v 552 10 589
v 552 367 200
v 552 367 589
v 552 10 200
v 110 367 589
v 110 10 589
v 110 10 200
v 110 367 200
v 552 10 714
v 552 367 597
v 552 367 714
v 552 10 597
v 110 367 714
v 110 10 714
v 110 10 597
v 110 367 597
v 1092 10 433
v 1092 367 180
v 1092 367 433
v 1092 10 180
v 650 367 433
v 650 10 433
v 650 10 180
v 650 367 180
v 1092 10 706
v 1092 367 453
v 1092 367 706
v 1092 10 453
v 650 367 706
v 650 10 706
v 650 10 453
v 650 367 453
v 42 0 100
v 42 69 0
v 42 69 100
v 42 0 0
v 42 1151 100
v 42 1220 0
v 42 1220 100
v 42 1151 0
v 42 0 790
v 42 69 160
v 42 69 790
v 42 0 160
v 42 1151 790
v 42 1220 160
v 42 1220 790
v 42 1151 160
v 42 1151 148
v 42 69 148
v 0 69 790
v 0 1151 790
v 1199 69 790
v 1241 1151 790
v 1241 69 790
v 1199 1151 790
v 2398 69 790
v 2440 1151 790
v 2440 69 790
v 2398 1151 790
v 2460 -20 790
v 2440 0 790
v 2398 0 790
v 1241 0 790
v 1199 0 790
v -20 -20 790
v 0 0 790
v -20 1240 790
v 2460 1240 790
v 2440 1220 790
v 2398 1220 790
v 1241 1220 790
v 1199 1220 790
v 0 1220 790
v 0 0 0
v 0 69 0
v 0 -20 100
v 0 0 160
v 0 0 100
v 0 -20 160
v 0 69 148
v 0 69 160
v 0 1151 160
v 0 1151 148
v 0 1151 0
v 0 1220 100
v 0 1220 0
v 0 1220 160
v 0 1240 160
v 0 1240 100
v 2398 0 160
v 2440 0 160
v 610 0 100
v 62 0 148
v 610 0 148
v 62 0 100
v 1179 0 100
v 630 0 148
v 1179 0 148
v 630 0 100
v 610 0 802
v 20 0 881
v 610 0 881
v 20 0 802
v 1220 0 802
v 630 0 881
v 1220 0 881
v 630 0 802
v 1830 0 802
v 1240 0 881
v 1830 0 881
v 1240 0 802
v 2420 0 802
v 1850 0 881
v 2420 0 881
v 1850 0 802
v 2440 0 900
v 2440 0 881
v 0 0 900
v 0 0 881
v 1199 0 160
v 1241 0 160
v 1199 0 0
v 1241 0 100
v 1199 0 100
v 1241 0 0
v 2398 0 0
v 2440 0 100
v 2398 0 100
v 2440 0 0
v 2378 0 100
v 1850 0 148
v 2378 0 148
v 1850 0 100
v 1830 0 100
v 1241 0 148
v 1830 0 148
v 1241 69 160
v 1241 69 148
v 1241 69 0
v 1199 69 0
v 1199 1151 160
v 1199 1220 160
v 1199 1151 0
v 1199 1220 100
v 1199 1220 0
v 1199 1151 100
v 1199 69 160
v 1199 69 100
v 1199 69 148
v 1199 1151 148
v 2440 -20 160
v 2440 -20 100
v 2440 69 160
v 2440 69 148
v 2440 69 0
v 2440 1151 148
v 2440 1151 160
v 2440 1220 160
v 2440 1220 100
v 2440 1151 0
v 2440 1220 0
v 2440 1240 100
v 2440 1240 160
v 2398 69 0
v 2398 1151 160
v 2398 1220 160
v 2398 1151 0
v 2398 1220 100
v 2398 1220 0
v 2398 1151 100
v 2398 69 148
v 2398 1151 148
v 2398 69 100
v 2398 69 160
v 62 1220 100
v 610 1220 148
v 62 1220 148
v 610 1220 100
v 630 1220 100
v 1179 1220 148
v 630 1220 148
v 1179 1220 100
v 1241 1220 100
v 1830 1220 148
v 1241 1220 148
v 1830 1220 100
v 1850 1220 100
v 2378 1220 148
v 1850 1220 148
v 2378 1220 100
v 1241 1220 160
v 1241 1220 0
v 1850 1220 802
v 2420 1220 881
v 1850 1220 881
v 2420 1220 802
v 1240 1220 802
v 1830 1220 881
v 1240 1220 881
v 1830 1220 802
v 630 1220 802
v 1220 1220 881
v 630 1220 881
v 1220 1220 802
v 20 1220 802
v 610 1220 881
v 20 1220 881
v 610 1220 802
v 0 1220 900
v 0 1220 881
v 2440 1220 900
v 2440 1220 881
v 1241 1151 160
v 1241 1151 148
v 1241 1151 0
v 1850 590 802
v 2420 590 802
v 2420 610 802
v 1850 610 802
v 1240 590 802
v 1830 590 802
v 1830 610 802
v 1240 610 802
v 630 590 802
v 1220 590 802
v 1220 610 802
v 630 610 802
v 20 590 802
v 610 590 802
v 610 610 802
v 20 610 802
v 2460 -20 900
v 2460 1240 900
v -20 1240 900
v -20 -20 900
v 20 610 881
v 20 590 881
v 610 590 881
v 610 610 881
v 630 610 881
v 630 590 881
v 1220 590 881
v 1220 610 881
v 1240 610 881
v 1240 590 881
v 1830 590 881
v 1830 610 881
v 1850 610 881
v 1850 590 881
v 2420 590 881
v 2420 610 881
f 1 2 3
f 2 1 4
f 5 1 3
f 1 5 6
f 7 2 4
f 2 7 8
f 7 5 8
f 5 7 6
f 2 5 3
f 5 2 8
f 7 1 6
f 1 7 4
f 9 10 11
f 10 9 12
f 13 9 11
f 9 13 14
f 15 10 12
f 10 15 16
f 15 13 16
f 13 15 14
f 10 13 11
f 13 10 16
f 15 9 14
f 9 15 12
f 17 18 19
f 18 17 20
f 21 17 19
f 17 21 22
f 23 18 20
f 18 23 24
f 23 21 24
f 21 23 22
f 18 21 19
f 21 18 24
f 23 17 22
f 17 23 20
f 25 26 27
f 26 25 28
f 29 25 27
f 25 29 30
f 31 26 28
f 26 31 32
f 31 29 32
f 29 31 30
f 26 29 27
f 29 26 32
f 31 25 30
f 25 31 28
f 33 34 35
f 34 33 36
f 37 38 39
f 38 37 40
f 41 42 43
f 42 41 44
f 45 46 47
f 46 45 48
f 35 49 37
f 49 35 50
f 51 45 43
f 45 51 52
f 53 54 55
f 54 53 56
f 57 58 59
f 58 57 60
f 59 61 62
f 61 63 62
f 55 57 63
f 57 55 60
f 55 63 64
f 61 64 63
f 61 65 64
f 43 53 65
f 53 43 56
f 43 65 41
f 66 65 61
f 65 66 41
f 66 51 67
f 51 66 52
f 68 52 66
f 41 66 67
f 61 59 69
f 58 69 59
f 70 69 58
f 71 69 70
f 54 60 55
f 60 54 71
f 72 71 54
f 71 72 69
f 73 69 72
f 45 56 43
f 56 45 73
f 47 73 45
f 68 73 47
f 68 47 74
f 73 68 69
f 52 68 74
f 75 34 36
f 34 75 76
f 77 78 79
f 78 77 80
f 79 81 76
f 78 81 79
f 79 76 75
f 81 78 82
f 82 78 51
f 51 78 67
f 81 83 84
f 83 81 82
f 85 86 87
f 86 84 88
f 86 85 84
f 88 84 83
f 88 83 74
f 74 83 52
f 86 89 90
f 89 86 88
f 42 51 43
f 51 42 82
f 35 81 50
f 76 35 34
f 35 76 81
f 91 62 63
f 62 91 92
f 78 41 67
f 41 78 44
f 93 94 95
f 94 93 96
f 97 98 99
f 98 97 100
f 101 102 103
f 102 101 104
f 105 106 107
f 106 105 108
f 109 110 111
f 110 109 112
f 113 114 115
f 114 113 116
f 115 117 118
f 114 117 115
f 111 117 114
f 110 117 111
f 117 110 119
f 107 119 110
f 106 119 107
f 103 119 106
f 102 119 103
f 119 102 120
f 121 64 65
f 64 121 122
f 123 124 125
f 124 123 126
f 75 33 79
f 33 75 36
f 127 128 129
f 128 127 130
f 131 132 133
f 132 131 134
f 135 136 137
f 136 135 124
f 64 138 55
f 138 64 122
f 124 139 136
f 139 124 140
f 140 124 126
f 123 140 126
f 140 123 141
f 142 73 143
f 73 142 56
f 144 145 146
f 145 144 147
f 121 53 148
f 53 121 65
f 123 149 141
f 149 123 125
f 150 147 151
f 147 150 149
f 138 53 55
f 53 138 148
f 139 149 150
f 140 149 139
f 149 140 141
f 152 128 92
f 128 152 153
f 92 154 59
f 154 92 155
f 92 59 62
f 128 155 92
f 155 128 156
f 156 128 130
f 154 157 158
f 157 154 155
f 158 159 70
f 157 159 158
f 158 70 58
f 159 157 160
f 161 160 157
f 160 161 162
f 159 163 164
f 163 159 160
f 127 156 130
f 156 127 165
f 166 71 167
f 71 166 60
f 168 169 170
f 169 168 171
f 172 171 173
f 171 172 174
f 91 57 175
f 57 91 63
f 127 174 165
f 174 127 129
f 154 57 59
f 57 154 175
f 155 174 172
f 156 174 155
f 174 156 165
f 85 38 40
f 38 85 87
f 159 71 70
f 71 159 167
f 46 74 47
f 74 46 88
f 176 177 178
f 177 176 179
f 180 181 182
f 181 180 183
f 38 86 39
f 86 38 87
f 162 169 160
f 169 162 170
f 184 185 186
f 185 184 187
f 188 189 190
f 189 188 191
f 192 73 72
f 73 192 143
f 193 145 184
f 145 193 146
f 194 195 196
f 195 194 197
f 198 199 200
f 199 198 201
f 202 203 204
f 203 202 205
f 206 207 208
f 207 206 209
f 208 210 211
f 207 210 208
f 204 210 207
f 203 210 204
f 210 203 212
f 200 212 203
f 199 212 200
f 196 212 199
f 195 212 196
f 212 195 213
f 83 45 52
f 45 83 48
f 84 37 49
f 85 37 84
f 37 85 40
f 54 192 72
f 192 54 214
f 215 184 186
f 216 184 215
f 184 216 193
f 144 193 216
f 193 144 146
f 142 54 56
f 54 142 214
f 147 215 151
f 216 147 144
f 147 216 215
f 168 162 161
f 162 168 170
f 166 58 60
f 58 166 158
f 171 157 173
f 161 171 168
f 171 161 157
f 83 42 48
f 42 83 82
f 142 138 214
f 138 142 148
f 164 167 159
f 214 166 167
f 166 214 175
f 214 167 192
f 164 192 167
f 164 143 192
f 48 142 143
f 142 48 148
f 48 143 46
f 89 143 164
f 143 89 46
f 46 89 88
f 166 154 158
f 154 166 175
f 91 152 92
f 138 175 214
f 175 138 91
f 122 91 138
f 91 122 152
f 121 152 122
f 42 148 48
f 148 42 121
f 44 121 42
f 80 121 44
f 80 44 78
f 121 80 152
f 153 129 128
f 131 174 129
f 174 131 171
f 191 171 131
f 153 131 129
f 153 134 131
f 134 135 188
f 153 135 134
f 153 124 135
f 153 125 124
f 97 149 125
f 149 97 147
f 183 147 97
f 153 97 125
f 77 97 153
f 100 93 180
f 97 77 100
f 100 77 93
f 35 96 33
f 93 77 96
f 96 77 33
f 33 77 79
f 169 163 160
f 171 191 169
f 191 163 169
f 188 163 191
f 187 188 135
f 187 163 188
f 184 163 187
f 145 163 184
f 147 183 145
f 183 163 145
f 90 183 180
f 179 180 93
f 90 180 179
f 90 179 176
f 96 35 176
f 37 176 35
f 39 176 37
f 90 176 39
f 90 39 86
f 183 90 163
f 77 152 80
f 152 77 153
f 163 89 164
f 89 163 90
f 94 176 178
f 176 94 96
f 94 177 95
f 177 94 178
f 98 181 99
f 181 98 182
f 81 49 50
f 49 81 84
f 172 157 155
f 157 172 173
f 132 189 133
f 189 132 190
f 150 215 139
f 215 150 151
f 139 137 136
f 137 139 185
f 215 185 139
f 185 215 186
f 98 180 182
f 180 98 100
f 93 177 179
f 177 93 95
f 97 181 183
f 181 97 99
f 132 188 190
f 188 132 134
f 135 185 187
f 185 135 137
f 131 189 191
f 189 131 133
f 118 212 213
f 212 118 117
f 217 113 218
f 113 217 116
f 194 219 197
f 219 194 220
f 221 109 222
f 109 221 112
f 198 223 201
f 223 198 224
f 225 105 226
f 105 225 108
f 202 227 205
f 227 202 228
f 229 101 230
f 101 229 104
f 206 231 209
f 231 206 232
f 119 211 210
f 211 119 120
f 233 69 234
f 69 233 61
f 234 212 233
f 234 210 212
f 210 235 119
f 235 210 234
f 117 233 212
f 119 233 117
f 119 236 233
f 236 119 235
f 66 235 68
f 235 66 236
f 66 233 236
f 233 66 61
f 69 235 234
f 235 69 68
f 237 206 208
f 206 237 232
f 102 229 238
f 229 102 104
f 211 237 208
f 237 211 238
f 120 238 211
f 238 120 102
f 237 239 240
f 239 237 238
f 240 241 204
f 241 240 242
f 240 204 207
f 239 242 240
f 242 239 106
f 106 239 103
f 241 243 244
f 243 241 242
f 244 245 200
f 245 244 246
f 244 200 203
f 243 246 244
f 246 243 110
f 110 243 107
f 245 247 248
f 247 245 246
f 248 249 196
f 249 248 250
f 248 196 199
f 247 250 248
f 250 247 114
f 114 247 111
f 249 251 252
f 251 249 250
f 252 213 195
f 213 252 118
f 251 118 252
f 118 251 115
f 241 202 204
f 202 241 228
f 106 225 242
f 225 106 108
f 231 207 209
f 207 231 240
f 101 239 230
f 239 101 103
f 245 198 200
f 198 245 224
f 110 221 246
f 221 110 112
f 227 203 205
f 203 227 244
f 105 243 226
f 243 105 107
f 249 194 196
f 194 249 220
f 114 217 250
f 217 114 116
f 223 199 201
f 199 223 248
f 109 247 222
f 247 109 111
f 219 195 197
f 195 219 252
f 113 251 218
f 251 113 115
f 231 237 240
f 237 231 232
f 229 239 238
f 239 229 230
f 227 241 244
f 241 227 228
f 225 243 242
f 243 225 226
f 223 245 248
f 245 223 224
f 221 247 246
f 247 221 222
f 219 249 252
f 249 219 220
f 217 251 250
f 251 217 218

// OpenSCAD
/*

    Nightstand
    
    By Anton Augustsson
    
    
*/

//https://www.hornbach.se/shop/MDF-Board-19x2440x1220-mm/5115465/artikel-detaljer.html
//https://www.hornbach.se/shop/Furuplywood-BB-X-12x1220x2440-mm-WBP-LIM/5507269/artikel-detaljer.html



/*
    ---------- Variables ---------- 
*/

standardSheathingWidth = 1220; 
standardSheathingLength = 2440;

mdfTopThickness = 19;
plywoodTopThickness = 12;

// Side protection for ply and mdf
edgeTopThickness = 20; 
edgeTopWidth = 110;
edgeTopLengthX = standardSheathingLength
    +2*edgeTopThickness;
edgeTopLengthY = standardSheathingWidth
    +2*edgeTopThickness;

// 4 list betweend mdf and ply (Pine)
listTopThickness = 20; 
listTopWidth = edgeTopWidth
    -plywoodTopThickness
    -mdfTopThickness;
listTopLengthX = standardSheathingLength/4
    -listTopThickness;
listTopLengthY = standardSheathingWidth;

// 6 legs (Pine)
legLength = 900-edgeTopWidth;
legWidth = 69;
legThickness = 42;

// 3 bottom list (Pine)
listBottomThickness = 20; 
listBottomWidth1 = 60;
listBottomWidth2 = listBottomWidth1
    -plywoodTopThickness;
listBottomLengthX = standardSheathingLength;
listBottomLengthY = standardSheathingWidth;
listBottomLengthY2 = standardSheathingWidth
    +listBottomThickness*2;
bottomHeight = 100;

/*
    ---------- Code ---------- 
*/


// storage blocks
translate([
    110,
    10,
    200]) 
cube(size = [
    442,
    357,
    389]);

// storage blocks
color("Gray")
translate([
    110,
    10,
    200+357+40]) 
cube(size = [
    442,
    357,
    117]);

// storage blocks
translate([
    650,
    10,
    180]) 
cube(size = [
    442,
    357,
    253]);

color("Gray")
// storage blocks
translate([
    650,
    10,
    180+253+20]) 
cube(size = [
    442,
    357,
    253]);



// ---------- Leg ----------

// leg 1
translate([
    0,
    0,
    0]) 
cube(size = [
    legThickness,
    legWidth,
    legLength]);

// leg 2
translate([
    standardSheathingLength/2
    -legThickness/2,
    0,
    0]) 
cube(size = [
    legThickness,
    legWidth,
    legLength]);

// leg 3
translate([
    standardSheathingLength
    -legThickness,
    0,
    0]) 
cube(size = [
    legThickness,
    legWidth,
    legLength]);

// leg 4
translate([
    0,
    standardSheathingWidth-legWidth,
    0]) 
cube(size = [
    legThickness,
    legWidth,
    legLength]);

// leg 5
translate([
    standardSheathingLength/2
    -legThickness/2,
    standardSheathingWidth-legWidth,
    0]) 
cube(size = [
    legThickness,
    legWidth,
    legLength]);

// leg 6
translate([
    standardSheathingLength
    -legThickness,
    standardSheathingWidth-legWidth,
    0]) 
cube(size = [
    legThickness,
    legWidth,
    legLength]);


// ---------- Bottom ----------
// front bottom list
translate([
    0,
    -listBottomThickness,
    bottomHeight]) 
cube(size = [
    listBottomLengthX,
    listBottomThickness,
    listBottomWidth1]);

// back bottom list
translate([
    0,
    standardSheathingWidth,
    bottomHeight]) 
cube(size = [
    listBottomLengthX,
    listBottomThickness,
    listBottomWidth1]);

// left bottom list
translate([
    legThickness,
    0,
    bottomHeight]) 
cube(size = [
    listBottomThickness,
    listBottomLengthY,
    listBottomWidth2]);

// midle left bottom list
translate([
    standardSheathingLength/4,
    0,
    bottomHeight]) 
cube(size = [
    listBottomThickness,
    listBottomLengthY,
    listBottomWidth2]);

// midle bottom list
translate([
    standardSheathingLength/2
    -legThickness/2
    -listBottomThickness,
    0,
    bottomHeight]) 
cube(size = [
    listBottomThickness,
    listBottomLengthY,
    listBottomWidth2]);

// midle right bottom list
translate([
    standardSheathingLength/4*3,
    0,
    bottomHeight]) 
cube(size = [
    listBottomThickness,
    listBottomLengthY,
    listBottomWidth2]);

// right bottom list
translate([
    standardSheathingLength
    -legThickness
    -listBottomThickness,
    0,
    bottomHeight]) 
cube(size = [
    listBottomThickness,
    listBottomLengthY,
    listBottomWidth2]);


// bottom ply
translate([
    0,
    0,
    bottomHeight+listBottomWidth2]) 
cube(size = [
    standardSheathingLength,
    standardSheathingWidth,
    plywoodTopThickness]);
    
// ---------- Top ----------

// top ply
translate([
    0,
    0,
    legLength]) 
cube(size = [
    standardSheathingLength,
    standardSheathingWidth,
    plywoodTopThickness]);
       
       
// top front edge
translate([
    -edgeTopThickness,
    -edgeTopThickness,
    legLength]) 
cube(size = [
    edgeTopLengthX,
    edgeTopThickness,
    edgeTopWidth]);
    
// top back edge
translate([
    -edgeTopThickness,
    standardSheathingWidth,
    legLength]) 
cube(size = [
    edgeTopLengthX,
    edgeTopThickness,
    edgeTopWidth]);

// top left edge
translate([
    -edgeTopThickness,
    -edgeTopThickness,
    legLength]) 
cube(size = [
    edgeTopThickness,
    edgeTopLengthY,
    edgeTopWidth]);
    
// top right edge
translate([
    standardSheathingLength,
    -edgeTopThickness,
    legLength]) 
cube(size = [
    edgeTopThickness,
    edgeTopLengthY,
    edgeTopWidth]);
    
    
// top left list
translate([
    0,
    0,
    legLength+plywoodTopThickness]) 
cube(size = [
    edgeTopThickness,
    listTopLengthY,
    listTopWidth]);

// top midle left list
translate([
    standardSheathingLength/4,
    0,
    legLength+plywoodTopThickness]) 
cube(size = [
    edgeTopThickness,
    listTopLengthY,
    listTopWidth]);

// top midle list
translate([
    standardSheathingLength/2,
    0,
    legLength+plywoodTopThickness]) 
cube(size = [
    edgeTopThickness,
    listTopLengthY,
    listTopWidth]);

// top right midle list
translate([
    standardSheathingLength/4*3,
    0,
    legLength+plywoodTopThickness]) 
cube(size = [
    edgeTopThickness,
    listTopLengthY,
    listTopWidth]);

// top right list
translate([
    standardSheathingLength-edgeTopThickness,
    0,
    legLength+plywoodTopThickness]) 
cube(size = [
    edgeTopThickness,
    listTopLengthY,
    listTopWidth]);


// top left lenght list
color("Gray")
translate([
    edgeTopThickness*1+listTopLengthX*0,
    standardSheathingWidth/2
    -edgeTopThickness,
    legLength+plywoodTopThickness]) 
cube(size = [
    listTopLengthX,
    edgeTopThickness,
    listTopWidth]);


// top left middle lenght list
color("Gray")
translate([
    edgeTopThickness*2+listTopLengthX*1,
    standardSheathingWidth/2
    -edgeTopThickness,
    legLength+plywoodTopThickness]) 
cube(size = [
    listTopLengthX,
    edgeTopThickness,
    listTopWidth]);


// top right midle lenght list
color("Gray")
translate([
    edgeTopThickness*3+listTopLengthX*2,
    standardSheathingWidth/2
    -edgeTopThickness,
    legLength+plywoodTopThickness]) 
cube(size = [
    listTopLengthX,
    edgeTopThickness,
    listTopWidth]);

// top right lenght list
color("Gray")
translate([
    edgeTopThickness*4+listTopLengthX*3,
    standardSheathingWidth/2
    -edgeTopThickness,
    legLength+plywoodTopThickness]) 
cube(size = [
    listTopLengthX,
    edgeTopThickness,
    listTopWidth]);



// mdf top
/*color("Tan")
translate([
    0,
    0,
    legLength+plywoodTopThickness
    +listTopWidth]) 
cube(size = [
    standardSheathingLength,
    standardSheathingWidth,
    mdfTopThickness]);
*/
